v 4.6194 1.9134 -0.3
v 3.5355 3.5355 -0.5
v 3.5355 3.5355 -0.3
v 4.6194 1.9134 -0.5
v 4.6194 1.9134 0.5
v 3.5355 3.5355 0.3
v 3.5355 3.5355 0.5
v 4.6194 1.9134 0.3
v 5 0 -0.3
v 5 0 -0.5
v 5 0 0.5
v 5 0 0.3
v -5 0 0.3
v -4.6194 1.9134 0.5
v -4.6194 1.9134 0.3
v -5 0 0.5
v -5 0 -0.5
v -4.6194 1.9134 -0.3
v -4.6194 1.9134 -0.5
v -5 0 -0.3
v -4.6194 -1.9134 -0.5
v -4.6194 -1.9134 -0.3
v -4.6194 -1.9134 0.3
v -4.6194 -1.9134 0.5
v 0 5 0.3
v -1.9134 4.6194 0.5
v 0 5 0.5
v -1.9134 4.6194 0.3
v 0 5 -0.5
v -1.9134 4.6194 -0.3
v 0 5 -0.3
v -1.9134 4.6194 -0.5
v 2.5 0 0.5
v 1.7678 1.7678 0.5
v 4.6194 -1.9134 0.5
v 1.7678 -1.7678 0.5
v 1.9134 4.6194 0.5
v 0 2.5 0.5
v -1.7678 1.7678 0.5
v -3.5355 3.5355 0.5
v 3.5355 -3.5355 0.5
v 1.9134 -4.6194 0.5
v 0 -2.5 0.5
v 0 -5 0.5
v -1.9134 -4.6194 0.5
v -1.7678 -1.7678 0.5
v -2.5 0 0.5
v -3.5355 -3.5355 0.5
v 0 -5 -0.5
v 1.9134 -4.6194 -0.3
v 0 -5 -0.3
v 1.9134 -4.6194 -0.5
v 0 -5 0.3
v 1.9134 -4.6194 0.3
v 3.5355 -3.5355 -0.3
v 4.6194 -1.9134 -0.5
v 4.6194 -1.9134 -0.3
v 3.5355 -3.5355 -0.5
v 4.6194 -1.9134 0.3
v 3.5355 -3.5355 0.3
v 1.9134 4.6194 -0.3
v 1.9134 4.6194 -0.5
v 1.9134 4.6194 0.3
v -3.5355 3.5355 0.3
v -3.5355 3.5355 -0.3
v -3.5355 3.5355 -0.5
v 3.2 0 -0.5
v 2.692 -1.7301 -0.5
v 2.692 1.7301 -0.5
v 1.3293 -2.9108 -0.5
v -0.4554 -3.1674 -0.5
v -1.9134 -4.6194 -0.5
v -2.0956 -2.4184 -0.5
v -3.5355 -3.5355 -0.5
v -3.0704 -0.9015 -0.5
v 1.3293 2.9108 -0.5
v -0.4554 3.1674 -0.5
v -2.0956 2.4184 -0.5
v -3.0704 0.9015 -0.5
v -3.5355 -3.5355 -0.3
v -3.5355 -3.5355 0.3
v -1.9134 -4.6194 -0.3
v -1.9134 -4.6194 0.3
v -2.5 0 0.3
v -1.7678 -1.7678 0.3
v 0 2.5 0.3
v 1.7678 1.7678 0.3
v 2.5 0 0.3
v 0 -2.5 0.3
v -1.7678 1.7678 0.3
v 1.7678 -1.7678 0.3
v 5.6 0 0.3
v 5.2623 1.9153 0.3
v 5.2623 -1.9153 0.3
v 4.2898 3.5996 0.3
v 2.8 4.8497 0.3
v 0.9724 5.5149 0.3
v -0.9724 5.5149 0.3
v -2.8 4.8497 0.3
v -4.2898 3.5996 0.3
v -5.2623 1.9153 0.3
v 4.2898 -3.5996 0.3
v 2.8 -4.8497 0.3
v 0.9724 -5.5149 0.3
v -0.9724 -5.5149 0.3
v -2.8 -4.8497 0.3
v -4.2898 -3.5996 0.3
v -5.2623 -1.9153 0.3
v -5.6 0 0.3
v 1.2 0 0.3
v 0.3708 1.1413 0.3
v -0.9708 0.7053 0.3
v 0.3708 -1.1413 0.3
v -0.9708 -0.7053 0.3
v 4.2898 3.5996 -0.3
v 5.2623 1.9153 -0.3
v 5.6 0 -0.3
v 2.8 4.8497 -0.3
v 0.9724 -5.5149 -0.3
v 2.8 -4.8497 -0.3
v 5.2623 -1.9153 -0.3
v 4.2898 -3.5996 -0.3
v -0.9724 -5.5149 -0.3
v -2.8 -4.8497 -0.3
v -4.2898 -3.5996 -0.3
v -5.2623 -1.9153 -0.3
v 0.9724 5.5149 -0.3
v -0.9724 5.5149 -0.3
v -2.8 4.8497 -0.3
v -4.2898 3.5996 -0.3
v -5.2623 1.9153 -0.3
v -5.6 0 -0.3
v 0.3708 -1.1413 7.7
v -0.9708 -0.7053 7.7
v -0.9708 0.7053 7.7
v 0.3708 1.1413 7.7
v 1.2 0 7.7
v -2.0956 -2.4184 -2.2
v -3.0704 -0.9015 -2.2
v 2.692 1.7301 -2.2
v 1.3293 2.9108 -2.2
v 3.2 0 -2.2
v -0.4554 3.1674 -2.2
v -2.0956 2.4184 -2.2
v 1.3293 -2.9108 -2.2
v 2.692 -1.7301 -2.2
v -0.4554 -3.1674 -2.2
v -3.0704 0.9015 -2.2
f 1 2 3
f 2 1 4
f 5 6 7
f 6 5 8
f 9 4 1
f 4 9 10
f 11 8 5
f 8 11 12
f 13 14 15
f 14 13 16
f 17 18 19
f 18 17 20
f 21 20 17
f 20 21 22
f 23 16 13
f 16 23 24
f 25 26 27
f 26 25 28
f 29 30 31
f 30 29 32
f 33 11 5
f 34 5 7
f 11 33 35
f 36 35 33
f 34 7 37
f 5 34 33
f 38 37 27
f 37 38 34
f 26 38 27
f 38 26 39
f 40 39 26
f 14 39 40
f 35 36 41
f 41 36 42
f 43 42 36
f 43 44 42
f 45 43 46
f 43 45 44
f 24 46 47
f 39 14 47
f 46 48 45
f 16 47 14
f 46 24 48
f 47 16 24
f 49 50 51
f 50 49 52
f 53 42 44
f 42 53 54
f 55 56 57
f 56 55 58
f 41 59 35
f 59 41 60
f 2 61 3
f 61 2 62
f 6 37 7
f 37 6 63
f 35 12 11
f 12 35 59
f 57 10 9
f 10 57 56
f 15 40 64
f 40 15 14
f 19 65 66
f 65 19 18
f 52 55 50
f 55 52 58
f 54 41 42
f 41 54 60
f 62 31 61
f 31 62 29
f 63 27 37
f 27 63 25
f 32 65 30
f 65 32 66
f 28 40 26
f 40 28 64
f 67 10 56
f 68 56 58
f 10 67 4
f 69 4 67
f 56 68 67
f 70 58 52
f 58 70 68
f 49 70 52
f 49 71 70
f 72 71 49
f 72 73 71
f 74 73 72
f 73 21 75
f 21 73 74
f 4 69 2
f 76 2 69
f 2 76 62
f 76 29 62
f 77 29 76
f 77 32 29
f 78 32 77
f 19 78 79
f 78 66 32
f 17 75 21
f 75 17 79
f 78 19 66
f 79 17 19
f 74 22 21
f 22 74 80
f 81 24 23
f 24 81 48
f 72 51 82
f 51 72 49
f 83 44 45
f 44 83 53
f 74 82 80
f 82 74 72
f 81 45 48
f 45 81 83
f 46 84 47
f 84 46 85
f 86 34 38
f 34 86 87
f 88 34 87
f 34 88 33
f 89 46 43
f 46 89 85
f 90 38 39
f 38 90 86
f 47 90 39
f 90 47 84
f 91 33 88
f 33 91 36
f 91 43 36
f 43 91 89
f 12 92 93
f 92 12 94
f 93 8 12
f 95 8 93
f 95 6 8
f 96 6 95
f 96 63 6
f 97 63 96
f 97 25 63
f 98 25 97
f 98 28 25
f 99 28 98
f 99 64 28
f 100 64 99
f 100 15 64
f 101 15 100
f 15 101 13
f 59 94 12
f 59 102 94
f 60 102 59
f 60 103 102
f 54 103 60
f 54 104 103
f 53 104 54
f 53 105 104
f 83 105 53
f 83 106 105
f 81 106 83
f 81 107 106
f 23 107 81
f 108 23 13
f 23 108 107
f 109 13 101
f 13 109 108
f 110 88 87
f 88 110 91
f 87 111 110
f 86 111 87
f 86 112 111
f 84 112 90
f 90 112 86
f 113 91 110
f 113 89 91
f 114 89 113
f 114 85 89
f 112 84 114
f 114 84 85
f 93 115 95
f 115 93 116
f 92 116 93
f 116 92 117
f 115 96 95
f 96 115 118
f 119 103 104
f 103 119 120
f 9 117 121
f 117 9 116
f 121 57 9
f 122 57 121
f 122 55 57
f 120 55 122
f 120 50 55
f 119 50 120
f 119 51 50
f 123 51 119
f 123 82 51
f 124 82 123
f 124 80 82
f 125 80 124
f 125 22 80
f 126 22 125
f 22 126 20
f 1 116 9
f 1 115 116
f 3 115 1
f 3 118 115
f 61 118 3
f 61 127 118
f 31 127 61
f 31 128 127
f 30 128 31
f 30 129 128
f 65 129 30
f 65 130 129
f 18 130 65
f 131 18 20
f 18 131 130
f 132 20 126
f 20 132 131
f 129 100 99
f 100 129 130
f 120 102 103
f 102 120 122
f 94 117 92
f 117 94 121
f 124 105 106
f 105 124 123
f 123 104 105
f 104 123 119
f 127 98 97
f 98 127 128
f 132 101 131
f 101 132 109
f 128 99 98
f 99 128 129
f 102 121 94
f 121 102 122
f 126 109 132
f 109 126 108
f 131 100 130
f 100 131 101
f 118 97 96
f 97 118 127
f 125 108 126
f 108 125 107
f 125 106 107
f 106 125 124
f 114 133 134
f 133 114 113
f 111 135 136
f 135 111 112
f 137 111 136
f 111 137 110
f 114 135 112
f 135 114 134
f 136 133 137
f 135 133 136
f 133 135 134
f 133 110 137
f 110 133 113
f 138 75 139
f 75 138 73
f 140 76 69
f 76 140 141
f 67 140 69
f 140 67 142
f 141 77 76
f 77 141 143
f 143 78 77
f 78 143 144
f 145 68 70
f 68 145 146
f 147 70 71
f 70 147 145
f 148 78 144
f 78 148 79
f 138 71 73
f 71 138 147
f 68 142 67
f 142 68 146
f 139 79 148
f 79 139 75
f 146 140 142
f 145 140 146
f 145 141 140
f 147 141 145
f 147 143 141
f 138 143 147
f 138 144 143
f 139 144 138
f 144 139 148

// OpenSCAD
// Parameters
inner_diameter_mm = 5; //[2.5:10:0.1]
outer_diameter_mm = 10; //[5:20:0.1]
thickness_mm = 1; //[0.5:2:0.1]
inner_radius_mm = 2.5; //[1.25:5:0.1]
outer_radius_mm = 5; //[2.5:10:0.1]
overlap_mm = 0.8; //[0.5:2:0.1]
grommet_lip_height_mm = 0.6; //[0.3:1.2:0.1]
grommet_lip_radial_mm = 0.6; //[0.3:1.5:0.1]
screw_shank_radius_mm = 1.2; //[0.6:2.4:0.1]
screw_shank_length_mm = 8; //[4:16:0.5]
nut_radius_mm = 3.2; //[1.6:6.4:0.1]
nut_thickness_mm = 2.5; //[1.25:5:0.1]

// Round Grommet Top
module round_grommet_top() {
  color([0.85, 0.85, 0.8]) {
    translate([0, 0, thickness_mm/2 + grommet_lip_height_mm/2 - overlap_mm])
      cylinder(r=outer_radius_mm + grommet_lip_radial_mm, h=grommet_lip_height_mm, center=true);
  }
}

// Round Grommet Assembly
module round_grommet_assembly() {
  color([0.85, 0.85, 0.8]) {
    difference() {
      cylinder(r=outer_radius_mm, h=thickness_mm, center=true);
      cylinder(r=inner_radius_mm, h=thickness_mm + 2*overlap_mm, center=true);
    }
    round_grommet_top();
  }
}

// Nut And Washer
module nut_and_washer() {
  color([0.8, 0.6, 0.2]) {
    translate([0, 0, -thickness_mm/2 - nut_thickness_mm/2 + overlap_mm])
      cylinder(r=nut_radius_mm, h=nut_thickness_mm, center=true);
  }
}

// Screw And Washer
module screw_and_washer() {
  color([0.4, 0.4, 0.43]) {
    translate([0, 0, thickness_mm/2 + screw_shank_length_mm/2 - overlap_mm])
      cylinder(r=screw_shank_radius_mm, h=screw_shank_length_mm, center=true);
  }
}

// Assembly
module assembly() {
  union() {
    round_grommet_assembly();
    screw_and_washer();
    nut_and_washer();
  }
}

assembly();
